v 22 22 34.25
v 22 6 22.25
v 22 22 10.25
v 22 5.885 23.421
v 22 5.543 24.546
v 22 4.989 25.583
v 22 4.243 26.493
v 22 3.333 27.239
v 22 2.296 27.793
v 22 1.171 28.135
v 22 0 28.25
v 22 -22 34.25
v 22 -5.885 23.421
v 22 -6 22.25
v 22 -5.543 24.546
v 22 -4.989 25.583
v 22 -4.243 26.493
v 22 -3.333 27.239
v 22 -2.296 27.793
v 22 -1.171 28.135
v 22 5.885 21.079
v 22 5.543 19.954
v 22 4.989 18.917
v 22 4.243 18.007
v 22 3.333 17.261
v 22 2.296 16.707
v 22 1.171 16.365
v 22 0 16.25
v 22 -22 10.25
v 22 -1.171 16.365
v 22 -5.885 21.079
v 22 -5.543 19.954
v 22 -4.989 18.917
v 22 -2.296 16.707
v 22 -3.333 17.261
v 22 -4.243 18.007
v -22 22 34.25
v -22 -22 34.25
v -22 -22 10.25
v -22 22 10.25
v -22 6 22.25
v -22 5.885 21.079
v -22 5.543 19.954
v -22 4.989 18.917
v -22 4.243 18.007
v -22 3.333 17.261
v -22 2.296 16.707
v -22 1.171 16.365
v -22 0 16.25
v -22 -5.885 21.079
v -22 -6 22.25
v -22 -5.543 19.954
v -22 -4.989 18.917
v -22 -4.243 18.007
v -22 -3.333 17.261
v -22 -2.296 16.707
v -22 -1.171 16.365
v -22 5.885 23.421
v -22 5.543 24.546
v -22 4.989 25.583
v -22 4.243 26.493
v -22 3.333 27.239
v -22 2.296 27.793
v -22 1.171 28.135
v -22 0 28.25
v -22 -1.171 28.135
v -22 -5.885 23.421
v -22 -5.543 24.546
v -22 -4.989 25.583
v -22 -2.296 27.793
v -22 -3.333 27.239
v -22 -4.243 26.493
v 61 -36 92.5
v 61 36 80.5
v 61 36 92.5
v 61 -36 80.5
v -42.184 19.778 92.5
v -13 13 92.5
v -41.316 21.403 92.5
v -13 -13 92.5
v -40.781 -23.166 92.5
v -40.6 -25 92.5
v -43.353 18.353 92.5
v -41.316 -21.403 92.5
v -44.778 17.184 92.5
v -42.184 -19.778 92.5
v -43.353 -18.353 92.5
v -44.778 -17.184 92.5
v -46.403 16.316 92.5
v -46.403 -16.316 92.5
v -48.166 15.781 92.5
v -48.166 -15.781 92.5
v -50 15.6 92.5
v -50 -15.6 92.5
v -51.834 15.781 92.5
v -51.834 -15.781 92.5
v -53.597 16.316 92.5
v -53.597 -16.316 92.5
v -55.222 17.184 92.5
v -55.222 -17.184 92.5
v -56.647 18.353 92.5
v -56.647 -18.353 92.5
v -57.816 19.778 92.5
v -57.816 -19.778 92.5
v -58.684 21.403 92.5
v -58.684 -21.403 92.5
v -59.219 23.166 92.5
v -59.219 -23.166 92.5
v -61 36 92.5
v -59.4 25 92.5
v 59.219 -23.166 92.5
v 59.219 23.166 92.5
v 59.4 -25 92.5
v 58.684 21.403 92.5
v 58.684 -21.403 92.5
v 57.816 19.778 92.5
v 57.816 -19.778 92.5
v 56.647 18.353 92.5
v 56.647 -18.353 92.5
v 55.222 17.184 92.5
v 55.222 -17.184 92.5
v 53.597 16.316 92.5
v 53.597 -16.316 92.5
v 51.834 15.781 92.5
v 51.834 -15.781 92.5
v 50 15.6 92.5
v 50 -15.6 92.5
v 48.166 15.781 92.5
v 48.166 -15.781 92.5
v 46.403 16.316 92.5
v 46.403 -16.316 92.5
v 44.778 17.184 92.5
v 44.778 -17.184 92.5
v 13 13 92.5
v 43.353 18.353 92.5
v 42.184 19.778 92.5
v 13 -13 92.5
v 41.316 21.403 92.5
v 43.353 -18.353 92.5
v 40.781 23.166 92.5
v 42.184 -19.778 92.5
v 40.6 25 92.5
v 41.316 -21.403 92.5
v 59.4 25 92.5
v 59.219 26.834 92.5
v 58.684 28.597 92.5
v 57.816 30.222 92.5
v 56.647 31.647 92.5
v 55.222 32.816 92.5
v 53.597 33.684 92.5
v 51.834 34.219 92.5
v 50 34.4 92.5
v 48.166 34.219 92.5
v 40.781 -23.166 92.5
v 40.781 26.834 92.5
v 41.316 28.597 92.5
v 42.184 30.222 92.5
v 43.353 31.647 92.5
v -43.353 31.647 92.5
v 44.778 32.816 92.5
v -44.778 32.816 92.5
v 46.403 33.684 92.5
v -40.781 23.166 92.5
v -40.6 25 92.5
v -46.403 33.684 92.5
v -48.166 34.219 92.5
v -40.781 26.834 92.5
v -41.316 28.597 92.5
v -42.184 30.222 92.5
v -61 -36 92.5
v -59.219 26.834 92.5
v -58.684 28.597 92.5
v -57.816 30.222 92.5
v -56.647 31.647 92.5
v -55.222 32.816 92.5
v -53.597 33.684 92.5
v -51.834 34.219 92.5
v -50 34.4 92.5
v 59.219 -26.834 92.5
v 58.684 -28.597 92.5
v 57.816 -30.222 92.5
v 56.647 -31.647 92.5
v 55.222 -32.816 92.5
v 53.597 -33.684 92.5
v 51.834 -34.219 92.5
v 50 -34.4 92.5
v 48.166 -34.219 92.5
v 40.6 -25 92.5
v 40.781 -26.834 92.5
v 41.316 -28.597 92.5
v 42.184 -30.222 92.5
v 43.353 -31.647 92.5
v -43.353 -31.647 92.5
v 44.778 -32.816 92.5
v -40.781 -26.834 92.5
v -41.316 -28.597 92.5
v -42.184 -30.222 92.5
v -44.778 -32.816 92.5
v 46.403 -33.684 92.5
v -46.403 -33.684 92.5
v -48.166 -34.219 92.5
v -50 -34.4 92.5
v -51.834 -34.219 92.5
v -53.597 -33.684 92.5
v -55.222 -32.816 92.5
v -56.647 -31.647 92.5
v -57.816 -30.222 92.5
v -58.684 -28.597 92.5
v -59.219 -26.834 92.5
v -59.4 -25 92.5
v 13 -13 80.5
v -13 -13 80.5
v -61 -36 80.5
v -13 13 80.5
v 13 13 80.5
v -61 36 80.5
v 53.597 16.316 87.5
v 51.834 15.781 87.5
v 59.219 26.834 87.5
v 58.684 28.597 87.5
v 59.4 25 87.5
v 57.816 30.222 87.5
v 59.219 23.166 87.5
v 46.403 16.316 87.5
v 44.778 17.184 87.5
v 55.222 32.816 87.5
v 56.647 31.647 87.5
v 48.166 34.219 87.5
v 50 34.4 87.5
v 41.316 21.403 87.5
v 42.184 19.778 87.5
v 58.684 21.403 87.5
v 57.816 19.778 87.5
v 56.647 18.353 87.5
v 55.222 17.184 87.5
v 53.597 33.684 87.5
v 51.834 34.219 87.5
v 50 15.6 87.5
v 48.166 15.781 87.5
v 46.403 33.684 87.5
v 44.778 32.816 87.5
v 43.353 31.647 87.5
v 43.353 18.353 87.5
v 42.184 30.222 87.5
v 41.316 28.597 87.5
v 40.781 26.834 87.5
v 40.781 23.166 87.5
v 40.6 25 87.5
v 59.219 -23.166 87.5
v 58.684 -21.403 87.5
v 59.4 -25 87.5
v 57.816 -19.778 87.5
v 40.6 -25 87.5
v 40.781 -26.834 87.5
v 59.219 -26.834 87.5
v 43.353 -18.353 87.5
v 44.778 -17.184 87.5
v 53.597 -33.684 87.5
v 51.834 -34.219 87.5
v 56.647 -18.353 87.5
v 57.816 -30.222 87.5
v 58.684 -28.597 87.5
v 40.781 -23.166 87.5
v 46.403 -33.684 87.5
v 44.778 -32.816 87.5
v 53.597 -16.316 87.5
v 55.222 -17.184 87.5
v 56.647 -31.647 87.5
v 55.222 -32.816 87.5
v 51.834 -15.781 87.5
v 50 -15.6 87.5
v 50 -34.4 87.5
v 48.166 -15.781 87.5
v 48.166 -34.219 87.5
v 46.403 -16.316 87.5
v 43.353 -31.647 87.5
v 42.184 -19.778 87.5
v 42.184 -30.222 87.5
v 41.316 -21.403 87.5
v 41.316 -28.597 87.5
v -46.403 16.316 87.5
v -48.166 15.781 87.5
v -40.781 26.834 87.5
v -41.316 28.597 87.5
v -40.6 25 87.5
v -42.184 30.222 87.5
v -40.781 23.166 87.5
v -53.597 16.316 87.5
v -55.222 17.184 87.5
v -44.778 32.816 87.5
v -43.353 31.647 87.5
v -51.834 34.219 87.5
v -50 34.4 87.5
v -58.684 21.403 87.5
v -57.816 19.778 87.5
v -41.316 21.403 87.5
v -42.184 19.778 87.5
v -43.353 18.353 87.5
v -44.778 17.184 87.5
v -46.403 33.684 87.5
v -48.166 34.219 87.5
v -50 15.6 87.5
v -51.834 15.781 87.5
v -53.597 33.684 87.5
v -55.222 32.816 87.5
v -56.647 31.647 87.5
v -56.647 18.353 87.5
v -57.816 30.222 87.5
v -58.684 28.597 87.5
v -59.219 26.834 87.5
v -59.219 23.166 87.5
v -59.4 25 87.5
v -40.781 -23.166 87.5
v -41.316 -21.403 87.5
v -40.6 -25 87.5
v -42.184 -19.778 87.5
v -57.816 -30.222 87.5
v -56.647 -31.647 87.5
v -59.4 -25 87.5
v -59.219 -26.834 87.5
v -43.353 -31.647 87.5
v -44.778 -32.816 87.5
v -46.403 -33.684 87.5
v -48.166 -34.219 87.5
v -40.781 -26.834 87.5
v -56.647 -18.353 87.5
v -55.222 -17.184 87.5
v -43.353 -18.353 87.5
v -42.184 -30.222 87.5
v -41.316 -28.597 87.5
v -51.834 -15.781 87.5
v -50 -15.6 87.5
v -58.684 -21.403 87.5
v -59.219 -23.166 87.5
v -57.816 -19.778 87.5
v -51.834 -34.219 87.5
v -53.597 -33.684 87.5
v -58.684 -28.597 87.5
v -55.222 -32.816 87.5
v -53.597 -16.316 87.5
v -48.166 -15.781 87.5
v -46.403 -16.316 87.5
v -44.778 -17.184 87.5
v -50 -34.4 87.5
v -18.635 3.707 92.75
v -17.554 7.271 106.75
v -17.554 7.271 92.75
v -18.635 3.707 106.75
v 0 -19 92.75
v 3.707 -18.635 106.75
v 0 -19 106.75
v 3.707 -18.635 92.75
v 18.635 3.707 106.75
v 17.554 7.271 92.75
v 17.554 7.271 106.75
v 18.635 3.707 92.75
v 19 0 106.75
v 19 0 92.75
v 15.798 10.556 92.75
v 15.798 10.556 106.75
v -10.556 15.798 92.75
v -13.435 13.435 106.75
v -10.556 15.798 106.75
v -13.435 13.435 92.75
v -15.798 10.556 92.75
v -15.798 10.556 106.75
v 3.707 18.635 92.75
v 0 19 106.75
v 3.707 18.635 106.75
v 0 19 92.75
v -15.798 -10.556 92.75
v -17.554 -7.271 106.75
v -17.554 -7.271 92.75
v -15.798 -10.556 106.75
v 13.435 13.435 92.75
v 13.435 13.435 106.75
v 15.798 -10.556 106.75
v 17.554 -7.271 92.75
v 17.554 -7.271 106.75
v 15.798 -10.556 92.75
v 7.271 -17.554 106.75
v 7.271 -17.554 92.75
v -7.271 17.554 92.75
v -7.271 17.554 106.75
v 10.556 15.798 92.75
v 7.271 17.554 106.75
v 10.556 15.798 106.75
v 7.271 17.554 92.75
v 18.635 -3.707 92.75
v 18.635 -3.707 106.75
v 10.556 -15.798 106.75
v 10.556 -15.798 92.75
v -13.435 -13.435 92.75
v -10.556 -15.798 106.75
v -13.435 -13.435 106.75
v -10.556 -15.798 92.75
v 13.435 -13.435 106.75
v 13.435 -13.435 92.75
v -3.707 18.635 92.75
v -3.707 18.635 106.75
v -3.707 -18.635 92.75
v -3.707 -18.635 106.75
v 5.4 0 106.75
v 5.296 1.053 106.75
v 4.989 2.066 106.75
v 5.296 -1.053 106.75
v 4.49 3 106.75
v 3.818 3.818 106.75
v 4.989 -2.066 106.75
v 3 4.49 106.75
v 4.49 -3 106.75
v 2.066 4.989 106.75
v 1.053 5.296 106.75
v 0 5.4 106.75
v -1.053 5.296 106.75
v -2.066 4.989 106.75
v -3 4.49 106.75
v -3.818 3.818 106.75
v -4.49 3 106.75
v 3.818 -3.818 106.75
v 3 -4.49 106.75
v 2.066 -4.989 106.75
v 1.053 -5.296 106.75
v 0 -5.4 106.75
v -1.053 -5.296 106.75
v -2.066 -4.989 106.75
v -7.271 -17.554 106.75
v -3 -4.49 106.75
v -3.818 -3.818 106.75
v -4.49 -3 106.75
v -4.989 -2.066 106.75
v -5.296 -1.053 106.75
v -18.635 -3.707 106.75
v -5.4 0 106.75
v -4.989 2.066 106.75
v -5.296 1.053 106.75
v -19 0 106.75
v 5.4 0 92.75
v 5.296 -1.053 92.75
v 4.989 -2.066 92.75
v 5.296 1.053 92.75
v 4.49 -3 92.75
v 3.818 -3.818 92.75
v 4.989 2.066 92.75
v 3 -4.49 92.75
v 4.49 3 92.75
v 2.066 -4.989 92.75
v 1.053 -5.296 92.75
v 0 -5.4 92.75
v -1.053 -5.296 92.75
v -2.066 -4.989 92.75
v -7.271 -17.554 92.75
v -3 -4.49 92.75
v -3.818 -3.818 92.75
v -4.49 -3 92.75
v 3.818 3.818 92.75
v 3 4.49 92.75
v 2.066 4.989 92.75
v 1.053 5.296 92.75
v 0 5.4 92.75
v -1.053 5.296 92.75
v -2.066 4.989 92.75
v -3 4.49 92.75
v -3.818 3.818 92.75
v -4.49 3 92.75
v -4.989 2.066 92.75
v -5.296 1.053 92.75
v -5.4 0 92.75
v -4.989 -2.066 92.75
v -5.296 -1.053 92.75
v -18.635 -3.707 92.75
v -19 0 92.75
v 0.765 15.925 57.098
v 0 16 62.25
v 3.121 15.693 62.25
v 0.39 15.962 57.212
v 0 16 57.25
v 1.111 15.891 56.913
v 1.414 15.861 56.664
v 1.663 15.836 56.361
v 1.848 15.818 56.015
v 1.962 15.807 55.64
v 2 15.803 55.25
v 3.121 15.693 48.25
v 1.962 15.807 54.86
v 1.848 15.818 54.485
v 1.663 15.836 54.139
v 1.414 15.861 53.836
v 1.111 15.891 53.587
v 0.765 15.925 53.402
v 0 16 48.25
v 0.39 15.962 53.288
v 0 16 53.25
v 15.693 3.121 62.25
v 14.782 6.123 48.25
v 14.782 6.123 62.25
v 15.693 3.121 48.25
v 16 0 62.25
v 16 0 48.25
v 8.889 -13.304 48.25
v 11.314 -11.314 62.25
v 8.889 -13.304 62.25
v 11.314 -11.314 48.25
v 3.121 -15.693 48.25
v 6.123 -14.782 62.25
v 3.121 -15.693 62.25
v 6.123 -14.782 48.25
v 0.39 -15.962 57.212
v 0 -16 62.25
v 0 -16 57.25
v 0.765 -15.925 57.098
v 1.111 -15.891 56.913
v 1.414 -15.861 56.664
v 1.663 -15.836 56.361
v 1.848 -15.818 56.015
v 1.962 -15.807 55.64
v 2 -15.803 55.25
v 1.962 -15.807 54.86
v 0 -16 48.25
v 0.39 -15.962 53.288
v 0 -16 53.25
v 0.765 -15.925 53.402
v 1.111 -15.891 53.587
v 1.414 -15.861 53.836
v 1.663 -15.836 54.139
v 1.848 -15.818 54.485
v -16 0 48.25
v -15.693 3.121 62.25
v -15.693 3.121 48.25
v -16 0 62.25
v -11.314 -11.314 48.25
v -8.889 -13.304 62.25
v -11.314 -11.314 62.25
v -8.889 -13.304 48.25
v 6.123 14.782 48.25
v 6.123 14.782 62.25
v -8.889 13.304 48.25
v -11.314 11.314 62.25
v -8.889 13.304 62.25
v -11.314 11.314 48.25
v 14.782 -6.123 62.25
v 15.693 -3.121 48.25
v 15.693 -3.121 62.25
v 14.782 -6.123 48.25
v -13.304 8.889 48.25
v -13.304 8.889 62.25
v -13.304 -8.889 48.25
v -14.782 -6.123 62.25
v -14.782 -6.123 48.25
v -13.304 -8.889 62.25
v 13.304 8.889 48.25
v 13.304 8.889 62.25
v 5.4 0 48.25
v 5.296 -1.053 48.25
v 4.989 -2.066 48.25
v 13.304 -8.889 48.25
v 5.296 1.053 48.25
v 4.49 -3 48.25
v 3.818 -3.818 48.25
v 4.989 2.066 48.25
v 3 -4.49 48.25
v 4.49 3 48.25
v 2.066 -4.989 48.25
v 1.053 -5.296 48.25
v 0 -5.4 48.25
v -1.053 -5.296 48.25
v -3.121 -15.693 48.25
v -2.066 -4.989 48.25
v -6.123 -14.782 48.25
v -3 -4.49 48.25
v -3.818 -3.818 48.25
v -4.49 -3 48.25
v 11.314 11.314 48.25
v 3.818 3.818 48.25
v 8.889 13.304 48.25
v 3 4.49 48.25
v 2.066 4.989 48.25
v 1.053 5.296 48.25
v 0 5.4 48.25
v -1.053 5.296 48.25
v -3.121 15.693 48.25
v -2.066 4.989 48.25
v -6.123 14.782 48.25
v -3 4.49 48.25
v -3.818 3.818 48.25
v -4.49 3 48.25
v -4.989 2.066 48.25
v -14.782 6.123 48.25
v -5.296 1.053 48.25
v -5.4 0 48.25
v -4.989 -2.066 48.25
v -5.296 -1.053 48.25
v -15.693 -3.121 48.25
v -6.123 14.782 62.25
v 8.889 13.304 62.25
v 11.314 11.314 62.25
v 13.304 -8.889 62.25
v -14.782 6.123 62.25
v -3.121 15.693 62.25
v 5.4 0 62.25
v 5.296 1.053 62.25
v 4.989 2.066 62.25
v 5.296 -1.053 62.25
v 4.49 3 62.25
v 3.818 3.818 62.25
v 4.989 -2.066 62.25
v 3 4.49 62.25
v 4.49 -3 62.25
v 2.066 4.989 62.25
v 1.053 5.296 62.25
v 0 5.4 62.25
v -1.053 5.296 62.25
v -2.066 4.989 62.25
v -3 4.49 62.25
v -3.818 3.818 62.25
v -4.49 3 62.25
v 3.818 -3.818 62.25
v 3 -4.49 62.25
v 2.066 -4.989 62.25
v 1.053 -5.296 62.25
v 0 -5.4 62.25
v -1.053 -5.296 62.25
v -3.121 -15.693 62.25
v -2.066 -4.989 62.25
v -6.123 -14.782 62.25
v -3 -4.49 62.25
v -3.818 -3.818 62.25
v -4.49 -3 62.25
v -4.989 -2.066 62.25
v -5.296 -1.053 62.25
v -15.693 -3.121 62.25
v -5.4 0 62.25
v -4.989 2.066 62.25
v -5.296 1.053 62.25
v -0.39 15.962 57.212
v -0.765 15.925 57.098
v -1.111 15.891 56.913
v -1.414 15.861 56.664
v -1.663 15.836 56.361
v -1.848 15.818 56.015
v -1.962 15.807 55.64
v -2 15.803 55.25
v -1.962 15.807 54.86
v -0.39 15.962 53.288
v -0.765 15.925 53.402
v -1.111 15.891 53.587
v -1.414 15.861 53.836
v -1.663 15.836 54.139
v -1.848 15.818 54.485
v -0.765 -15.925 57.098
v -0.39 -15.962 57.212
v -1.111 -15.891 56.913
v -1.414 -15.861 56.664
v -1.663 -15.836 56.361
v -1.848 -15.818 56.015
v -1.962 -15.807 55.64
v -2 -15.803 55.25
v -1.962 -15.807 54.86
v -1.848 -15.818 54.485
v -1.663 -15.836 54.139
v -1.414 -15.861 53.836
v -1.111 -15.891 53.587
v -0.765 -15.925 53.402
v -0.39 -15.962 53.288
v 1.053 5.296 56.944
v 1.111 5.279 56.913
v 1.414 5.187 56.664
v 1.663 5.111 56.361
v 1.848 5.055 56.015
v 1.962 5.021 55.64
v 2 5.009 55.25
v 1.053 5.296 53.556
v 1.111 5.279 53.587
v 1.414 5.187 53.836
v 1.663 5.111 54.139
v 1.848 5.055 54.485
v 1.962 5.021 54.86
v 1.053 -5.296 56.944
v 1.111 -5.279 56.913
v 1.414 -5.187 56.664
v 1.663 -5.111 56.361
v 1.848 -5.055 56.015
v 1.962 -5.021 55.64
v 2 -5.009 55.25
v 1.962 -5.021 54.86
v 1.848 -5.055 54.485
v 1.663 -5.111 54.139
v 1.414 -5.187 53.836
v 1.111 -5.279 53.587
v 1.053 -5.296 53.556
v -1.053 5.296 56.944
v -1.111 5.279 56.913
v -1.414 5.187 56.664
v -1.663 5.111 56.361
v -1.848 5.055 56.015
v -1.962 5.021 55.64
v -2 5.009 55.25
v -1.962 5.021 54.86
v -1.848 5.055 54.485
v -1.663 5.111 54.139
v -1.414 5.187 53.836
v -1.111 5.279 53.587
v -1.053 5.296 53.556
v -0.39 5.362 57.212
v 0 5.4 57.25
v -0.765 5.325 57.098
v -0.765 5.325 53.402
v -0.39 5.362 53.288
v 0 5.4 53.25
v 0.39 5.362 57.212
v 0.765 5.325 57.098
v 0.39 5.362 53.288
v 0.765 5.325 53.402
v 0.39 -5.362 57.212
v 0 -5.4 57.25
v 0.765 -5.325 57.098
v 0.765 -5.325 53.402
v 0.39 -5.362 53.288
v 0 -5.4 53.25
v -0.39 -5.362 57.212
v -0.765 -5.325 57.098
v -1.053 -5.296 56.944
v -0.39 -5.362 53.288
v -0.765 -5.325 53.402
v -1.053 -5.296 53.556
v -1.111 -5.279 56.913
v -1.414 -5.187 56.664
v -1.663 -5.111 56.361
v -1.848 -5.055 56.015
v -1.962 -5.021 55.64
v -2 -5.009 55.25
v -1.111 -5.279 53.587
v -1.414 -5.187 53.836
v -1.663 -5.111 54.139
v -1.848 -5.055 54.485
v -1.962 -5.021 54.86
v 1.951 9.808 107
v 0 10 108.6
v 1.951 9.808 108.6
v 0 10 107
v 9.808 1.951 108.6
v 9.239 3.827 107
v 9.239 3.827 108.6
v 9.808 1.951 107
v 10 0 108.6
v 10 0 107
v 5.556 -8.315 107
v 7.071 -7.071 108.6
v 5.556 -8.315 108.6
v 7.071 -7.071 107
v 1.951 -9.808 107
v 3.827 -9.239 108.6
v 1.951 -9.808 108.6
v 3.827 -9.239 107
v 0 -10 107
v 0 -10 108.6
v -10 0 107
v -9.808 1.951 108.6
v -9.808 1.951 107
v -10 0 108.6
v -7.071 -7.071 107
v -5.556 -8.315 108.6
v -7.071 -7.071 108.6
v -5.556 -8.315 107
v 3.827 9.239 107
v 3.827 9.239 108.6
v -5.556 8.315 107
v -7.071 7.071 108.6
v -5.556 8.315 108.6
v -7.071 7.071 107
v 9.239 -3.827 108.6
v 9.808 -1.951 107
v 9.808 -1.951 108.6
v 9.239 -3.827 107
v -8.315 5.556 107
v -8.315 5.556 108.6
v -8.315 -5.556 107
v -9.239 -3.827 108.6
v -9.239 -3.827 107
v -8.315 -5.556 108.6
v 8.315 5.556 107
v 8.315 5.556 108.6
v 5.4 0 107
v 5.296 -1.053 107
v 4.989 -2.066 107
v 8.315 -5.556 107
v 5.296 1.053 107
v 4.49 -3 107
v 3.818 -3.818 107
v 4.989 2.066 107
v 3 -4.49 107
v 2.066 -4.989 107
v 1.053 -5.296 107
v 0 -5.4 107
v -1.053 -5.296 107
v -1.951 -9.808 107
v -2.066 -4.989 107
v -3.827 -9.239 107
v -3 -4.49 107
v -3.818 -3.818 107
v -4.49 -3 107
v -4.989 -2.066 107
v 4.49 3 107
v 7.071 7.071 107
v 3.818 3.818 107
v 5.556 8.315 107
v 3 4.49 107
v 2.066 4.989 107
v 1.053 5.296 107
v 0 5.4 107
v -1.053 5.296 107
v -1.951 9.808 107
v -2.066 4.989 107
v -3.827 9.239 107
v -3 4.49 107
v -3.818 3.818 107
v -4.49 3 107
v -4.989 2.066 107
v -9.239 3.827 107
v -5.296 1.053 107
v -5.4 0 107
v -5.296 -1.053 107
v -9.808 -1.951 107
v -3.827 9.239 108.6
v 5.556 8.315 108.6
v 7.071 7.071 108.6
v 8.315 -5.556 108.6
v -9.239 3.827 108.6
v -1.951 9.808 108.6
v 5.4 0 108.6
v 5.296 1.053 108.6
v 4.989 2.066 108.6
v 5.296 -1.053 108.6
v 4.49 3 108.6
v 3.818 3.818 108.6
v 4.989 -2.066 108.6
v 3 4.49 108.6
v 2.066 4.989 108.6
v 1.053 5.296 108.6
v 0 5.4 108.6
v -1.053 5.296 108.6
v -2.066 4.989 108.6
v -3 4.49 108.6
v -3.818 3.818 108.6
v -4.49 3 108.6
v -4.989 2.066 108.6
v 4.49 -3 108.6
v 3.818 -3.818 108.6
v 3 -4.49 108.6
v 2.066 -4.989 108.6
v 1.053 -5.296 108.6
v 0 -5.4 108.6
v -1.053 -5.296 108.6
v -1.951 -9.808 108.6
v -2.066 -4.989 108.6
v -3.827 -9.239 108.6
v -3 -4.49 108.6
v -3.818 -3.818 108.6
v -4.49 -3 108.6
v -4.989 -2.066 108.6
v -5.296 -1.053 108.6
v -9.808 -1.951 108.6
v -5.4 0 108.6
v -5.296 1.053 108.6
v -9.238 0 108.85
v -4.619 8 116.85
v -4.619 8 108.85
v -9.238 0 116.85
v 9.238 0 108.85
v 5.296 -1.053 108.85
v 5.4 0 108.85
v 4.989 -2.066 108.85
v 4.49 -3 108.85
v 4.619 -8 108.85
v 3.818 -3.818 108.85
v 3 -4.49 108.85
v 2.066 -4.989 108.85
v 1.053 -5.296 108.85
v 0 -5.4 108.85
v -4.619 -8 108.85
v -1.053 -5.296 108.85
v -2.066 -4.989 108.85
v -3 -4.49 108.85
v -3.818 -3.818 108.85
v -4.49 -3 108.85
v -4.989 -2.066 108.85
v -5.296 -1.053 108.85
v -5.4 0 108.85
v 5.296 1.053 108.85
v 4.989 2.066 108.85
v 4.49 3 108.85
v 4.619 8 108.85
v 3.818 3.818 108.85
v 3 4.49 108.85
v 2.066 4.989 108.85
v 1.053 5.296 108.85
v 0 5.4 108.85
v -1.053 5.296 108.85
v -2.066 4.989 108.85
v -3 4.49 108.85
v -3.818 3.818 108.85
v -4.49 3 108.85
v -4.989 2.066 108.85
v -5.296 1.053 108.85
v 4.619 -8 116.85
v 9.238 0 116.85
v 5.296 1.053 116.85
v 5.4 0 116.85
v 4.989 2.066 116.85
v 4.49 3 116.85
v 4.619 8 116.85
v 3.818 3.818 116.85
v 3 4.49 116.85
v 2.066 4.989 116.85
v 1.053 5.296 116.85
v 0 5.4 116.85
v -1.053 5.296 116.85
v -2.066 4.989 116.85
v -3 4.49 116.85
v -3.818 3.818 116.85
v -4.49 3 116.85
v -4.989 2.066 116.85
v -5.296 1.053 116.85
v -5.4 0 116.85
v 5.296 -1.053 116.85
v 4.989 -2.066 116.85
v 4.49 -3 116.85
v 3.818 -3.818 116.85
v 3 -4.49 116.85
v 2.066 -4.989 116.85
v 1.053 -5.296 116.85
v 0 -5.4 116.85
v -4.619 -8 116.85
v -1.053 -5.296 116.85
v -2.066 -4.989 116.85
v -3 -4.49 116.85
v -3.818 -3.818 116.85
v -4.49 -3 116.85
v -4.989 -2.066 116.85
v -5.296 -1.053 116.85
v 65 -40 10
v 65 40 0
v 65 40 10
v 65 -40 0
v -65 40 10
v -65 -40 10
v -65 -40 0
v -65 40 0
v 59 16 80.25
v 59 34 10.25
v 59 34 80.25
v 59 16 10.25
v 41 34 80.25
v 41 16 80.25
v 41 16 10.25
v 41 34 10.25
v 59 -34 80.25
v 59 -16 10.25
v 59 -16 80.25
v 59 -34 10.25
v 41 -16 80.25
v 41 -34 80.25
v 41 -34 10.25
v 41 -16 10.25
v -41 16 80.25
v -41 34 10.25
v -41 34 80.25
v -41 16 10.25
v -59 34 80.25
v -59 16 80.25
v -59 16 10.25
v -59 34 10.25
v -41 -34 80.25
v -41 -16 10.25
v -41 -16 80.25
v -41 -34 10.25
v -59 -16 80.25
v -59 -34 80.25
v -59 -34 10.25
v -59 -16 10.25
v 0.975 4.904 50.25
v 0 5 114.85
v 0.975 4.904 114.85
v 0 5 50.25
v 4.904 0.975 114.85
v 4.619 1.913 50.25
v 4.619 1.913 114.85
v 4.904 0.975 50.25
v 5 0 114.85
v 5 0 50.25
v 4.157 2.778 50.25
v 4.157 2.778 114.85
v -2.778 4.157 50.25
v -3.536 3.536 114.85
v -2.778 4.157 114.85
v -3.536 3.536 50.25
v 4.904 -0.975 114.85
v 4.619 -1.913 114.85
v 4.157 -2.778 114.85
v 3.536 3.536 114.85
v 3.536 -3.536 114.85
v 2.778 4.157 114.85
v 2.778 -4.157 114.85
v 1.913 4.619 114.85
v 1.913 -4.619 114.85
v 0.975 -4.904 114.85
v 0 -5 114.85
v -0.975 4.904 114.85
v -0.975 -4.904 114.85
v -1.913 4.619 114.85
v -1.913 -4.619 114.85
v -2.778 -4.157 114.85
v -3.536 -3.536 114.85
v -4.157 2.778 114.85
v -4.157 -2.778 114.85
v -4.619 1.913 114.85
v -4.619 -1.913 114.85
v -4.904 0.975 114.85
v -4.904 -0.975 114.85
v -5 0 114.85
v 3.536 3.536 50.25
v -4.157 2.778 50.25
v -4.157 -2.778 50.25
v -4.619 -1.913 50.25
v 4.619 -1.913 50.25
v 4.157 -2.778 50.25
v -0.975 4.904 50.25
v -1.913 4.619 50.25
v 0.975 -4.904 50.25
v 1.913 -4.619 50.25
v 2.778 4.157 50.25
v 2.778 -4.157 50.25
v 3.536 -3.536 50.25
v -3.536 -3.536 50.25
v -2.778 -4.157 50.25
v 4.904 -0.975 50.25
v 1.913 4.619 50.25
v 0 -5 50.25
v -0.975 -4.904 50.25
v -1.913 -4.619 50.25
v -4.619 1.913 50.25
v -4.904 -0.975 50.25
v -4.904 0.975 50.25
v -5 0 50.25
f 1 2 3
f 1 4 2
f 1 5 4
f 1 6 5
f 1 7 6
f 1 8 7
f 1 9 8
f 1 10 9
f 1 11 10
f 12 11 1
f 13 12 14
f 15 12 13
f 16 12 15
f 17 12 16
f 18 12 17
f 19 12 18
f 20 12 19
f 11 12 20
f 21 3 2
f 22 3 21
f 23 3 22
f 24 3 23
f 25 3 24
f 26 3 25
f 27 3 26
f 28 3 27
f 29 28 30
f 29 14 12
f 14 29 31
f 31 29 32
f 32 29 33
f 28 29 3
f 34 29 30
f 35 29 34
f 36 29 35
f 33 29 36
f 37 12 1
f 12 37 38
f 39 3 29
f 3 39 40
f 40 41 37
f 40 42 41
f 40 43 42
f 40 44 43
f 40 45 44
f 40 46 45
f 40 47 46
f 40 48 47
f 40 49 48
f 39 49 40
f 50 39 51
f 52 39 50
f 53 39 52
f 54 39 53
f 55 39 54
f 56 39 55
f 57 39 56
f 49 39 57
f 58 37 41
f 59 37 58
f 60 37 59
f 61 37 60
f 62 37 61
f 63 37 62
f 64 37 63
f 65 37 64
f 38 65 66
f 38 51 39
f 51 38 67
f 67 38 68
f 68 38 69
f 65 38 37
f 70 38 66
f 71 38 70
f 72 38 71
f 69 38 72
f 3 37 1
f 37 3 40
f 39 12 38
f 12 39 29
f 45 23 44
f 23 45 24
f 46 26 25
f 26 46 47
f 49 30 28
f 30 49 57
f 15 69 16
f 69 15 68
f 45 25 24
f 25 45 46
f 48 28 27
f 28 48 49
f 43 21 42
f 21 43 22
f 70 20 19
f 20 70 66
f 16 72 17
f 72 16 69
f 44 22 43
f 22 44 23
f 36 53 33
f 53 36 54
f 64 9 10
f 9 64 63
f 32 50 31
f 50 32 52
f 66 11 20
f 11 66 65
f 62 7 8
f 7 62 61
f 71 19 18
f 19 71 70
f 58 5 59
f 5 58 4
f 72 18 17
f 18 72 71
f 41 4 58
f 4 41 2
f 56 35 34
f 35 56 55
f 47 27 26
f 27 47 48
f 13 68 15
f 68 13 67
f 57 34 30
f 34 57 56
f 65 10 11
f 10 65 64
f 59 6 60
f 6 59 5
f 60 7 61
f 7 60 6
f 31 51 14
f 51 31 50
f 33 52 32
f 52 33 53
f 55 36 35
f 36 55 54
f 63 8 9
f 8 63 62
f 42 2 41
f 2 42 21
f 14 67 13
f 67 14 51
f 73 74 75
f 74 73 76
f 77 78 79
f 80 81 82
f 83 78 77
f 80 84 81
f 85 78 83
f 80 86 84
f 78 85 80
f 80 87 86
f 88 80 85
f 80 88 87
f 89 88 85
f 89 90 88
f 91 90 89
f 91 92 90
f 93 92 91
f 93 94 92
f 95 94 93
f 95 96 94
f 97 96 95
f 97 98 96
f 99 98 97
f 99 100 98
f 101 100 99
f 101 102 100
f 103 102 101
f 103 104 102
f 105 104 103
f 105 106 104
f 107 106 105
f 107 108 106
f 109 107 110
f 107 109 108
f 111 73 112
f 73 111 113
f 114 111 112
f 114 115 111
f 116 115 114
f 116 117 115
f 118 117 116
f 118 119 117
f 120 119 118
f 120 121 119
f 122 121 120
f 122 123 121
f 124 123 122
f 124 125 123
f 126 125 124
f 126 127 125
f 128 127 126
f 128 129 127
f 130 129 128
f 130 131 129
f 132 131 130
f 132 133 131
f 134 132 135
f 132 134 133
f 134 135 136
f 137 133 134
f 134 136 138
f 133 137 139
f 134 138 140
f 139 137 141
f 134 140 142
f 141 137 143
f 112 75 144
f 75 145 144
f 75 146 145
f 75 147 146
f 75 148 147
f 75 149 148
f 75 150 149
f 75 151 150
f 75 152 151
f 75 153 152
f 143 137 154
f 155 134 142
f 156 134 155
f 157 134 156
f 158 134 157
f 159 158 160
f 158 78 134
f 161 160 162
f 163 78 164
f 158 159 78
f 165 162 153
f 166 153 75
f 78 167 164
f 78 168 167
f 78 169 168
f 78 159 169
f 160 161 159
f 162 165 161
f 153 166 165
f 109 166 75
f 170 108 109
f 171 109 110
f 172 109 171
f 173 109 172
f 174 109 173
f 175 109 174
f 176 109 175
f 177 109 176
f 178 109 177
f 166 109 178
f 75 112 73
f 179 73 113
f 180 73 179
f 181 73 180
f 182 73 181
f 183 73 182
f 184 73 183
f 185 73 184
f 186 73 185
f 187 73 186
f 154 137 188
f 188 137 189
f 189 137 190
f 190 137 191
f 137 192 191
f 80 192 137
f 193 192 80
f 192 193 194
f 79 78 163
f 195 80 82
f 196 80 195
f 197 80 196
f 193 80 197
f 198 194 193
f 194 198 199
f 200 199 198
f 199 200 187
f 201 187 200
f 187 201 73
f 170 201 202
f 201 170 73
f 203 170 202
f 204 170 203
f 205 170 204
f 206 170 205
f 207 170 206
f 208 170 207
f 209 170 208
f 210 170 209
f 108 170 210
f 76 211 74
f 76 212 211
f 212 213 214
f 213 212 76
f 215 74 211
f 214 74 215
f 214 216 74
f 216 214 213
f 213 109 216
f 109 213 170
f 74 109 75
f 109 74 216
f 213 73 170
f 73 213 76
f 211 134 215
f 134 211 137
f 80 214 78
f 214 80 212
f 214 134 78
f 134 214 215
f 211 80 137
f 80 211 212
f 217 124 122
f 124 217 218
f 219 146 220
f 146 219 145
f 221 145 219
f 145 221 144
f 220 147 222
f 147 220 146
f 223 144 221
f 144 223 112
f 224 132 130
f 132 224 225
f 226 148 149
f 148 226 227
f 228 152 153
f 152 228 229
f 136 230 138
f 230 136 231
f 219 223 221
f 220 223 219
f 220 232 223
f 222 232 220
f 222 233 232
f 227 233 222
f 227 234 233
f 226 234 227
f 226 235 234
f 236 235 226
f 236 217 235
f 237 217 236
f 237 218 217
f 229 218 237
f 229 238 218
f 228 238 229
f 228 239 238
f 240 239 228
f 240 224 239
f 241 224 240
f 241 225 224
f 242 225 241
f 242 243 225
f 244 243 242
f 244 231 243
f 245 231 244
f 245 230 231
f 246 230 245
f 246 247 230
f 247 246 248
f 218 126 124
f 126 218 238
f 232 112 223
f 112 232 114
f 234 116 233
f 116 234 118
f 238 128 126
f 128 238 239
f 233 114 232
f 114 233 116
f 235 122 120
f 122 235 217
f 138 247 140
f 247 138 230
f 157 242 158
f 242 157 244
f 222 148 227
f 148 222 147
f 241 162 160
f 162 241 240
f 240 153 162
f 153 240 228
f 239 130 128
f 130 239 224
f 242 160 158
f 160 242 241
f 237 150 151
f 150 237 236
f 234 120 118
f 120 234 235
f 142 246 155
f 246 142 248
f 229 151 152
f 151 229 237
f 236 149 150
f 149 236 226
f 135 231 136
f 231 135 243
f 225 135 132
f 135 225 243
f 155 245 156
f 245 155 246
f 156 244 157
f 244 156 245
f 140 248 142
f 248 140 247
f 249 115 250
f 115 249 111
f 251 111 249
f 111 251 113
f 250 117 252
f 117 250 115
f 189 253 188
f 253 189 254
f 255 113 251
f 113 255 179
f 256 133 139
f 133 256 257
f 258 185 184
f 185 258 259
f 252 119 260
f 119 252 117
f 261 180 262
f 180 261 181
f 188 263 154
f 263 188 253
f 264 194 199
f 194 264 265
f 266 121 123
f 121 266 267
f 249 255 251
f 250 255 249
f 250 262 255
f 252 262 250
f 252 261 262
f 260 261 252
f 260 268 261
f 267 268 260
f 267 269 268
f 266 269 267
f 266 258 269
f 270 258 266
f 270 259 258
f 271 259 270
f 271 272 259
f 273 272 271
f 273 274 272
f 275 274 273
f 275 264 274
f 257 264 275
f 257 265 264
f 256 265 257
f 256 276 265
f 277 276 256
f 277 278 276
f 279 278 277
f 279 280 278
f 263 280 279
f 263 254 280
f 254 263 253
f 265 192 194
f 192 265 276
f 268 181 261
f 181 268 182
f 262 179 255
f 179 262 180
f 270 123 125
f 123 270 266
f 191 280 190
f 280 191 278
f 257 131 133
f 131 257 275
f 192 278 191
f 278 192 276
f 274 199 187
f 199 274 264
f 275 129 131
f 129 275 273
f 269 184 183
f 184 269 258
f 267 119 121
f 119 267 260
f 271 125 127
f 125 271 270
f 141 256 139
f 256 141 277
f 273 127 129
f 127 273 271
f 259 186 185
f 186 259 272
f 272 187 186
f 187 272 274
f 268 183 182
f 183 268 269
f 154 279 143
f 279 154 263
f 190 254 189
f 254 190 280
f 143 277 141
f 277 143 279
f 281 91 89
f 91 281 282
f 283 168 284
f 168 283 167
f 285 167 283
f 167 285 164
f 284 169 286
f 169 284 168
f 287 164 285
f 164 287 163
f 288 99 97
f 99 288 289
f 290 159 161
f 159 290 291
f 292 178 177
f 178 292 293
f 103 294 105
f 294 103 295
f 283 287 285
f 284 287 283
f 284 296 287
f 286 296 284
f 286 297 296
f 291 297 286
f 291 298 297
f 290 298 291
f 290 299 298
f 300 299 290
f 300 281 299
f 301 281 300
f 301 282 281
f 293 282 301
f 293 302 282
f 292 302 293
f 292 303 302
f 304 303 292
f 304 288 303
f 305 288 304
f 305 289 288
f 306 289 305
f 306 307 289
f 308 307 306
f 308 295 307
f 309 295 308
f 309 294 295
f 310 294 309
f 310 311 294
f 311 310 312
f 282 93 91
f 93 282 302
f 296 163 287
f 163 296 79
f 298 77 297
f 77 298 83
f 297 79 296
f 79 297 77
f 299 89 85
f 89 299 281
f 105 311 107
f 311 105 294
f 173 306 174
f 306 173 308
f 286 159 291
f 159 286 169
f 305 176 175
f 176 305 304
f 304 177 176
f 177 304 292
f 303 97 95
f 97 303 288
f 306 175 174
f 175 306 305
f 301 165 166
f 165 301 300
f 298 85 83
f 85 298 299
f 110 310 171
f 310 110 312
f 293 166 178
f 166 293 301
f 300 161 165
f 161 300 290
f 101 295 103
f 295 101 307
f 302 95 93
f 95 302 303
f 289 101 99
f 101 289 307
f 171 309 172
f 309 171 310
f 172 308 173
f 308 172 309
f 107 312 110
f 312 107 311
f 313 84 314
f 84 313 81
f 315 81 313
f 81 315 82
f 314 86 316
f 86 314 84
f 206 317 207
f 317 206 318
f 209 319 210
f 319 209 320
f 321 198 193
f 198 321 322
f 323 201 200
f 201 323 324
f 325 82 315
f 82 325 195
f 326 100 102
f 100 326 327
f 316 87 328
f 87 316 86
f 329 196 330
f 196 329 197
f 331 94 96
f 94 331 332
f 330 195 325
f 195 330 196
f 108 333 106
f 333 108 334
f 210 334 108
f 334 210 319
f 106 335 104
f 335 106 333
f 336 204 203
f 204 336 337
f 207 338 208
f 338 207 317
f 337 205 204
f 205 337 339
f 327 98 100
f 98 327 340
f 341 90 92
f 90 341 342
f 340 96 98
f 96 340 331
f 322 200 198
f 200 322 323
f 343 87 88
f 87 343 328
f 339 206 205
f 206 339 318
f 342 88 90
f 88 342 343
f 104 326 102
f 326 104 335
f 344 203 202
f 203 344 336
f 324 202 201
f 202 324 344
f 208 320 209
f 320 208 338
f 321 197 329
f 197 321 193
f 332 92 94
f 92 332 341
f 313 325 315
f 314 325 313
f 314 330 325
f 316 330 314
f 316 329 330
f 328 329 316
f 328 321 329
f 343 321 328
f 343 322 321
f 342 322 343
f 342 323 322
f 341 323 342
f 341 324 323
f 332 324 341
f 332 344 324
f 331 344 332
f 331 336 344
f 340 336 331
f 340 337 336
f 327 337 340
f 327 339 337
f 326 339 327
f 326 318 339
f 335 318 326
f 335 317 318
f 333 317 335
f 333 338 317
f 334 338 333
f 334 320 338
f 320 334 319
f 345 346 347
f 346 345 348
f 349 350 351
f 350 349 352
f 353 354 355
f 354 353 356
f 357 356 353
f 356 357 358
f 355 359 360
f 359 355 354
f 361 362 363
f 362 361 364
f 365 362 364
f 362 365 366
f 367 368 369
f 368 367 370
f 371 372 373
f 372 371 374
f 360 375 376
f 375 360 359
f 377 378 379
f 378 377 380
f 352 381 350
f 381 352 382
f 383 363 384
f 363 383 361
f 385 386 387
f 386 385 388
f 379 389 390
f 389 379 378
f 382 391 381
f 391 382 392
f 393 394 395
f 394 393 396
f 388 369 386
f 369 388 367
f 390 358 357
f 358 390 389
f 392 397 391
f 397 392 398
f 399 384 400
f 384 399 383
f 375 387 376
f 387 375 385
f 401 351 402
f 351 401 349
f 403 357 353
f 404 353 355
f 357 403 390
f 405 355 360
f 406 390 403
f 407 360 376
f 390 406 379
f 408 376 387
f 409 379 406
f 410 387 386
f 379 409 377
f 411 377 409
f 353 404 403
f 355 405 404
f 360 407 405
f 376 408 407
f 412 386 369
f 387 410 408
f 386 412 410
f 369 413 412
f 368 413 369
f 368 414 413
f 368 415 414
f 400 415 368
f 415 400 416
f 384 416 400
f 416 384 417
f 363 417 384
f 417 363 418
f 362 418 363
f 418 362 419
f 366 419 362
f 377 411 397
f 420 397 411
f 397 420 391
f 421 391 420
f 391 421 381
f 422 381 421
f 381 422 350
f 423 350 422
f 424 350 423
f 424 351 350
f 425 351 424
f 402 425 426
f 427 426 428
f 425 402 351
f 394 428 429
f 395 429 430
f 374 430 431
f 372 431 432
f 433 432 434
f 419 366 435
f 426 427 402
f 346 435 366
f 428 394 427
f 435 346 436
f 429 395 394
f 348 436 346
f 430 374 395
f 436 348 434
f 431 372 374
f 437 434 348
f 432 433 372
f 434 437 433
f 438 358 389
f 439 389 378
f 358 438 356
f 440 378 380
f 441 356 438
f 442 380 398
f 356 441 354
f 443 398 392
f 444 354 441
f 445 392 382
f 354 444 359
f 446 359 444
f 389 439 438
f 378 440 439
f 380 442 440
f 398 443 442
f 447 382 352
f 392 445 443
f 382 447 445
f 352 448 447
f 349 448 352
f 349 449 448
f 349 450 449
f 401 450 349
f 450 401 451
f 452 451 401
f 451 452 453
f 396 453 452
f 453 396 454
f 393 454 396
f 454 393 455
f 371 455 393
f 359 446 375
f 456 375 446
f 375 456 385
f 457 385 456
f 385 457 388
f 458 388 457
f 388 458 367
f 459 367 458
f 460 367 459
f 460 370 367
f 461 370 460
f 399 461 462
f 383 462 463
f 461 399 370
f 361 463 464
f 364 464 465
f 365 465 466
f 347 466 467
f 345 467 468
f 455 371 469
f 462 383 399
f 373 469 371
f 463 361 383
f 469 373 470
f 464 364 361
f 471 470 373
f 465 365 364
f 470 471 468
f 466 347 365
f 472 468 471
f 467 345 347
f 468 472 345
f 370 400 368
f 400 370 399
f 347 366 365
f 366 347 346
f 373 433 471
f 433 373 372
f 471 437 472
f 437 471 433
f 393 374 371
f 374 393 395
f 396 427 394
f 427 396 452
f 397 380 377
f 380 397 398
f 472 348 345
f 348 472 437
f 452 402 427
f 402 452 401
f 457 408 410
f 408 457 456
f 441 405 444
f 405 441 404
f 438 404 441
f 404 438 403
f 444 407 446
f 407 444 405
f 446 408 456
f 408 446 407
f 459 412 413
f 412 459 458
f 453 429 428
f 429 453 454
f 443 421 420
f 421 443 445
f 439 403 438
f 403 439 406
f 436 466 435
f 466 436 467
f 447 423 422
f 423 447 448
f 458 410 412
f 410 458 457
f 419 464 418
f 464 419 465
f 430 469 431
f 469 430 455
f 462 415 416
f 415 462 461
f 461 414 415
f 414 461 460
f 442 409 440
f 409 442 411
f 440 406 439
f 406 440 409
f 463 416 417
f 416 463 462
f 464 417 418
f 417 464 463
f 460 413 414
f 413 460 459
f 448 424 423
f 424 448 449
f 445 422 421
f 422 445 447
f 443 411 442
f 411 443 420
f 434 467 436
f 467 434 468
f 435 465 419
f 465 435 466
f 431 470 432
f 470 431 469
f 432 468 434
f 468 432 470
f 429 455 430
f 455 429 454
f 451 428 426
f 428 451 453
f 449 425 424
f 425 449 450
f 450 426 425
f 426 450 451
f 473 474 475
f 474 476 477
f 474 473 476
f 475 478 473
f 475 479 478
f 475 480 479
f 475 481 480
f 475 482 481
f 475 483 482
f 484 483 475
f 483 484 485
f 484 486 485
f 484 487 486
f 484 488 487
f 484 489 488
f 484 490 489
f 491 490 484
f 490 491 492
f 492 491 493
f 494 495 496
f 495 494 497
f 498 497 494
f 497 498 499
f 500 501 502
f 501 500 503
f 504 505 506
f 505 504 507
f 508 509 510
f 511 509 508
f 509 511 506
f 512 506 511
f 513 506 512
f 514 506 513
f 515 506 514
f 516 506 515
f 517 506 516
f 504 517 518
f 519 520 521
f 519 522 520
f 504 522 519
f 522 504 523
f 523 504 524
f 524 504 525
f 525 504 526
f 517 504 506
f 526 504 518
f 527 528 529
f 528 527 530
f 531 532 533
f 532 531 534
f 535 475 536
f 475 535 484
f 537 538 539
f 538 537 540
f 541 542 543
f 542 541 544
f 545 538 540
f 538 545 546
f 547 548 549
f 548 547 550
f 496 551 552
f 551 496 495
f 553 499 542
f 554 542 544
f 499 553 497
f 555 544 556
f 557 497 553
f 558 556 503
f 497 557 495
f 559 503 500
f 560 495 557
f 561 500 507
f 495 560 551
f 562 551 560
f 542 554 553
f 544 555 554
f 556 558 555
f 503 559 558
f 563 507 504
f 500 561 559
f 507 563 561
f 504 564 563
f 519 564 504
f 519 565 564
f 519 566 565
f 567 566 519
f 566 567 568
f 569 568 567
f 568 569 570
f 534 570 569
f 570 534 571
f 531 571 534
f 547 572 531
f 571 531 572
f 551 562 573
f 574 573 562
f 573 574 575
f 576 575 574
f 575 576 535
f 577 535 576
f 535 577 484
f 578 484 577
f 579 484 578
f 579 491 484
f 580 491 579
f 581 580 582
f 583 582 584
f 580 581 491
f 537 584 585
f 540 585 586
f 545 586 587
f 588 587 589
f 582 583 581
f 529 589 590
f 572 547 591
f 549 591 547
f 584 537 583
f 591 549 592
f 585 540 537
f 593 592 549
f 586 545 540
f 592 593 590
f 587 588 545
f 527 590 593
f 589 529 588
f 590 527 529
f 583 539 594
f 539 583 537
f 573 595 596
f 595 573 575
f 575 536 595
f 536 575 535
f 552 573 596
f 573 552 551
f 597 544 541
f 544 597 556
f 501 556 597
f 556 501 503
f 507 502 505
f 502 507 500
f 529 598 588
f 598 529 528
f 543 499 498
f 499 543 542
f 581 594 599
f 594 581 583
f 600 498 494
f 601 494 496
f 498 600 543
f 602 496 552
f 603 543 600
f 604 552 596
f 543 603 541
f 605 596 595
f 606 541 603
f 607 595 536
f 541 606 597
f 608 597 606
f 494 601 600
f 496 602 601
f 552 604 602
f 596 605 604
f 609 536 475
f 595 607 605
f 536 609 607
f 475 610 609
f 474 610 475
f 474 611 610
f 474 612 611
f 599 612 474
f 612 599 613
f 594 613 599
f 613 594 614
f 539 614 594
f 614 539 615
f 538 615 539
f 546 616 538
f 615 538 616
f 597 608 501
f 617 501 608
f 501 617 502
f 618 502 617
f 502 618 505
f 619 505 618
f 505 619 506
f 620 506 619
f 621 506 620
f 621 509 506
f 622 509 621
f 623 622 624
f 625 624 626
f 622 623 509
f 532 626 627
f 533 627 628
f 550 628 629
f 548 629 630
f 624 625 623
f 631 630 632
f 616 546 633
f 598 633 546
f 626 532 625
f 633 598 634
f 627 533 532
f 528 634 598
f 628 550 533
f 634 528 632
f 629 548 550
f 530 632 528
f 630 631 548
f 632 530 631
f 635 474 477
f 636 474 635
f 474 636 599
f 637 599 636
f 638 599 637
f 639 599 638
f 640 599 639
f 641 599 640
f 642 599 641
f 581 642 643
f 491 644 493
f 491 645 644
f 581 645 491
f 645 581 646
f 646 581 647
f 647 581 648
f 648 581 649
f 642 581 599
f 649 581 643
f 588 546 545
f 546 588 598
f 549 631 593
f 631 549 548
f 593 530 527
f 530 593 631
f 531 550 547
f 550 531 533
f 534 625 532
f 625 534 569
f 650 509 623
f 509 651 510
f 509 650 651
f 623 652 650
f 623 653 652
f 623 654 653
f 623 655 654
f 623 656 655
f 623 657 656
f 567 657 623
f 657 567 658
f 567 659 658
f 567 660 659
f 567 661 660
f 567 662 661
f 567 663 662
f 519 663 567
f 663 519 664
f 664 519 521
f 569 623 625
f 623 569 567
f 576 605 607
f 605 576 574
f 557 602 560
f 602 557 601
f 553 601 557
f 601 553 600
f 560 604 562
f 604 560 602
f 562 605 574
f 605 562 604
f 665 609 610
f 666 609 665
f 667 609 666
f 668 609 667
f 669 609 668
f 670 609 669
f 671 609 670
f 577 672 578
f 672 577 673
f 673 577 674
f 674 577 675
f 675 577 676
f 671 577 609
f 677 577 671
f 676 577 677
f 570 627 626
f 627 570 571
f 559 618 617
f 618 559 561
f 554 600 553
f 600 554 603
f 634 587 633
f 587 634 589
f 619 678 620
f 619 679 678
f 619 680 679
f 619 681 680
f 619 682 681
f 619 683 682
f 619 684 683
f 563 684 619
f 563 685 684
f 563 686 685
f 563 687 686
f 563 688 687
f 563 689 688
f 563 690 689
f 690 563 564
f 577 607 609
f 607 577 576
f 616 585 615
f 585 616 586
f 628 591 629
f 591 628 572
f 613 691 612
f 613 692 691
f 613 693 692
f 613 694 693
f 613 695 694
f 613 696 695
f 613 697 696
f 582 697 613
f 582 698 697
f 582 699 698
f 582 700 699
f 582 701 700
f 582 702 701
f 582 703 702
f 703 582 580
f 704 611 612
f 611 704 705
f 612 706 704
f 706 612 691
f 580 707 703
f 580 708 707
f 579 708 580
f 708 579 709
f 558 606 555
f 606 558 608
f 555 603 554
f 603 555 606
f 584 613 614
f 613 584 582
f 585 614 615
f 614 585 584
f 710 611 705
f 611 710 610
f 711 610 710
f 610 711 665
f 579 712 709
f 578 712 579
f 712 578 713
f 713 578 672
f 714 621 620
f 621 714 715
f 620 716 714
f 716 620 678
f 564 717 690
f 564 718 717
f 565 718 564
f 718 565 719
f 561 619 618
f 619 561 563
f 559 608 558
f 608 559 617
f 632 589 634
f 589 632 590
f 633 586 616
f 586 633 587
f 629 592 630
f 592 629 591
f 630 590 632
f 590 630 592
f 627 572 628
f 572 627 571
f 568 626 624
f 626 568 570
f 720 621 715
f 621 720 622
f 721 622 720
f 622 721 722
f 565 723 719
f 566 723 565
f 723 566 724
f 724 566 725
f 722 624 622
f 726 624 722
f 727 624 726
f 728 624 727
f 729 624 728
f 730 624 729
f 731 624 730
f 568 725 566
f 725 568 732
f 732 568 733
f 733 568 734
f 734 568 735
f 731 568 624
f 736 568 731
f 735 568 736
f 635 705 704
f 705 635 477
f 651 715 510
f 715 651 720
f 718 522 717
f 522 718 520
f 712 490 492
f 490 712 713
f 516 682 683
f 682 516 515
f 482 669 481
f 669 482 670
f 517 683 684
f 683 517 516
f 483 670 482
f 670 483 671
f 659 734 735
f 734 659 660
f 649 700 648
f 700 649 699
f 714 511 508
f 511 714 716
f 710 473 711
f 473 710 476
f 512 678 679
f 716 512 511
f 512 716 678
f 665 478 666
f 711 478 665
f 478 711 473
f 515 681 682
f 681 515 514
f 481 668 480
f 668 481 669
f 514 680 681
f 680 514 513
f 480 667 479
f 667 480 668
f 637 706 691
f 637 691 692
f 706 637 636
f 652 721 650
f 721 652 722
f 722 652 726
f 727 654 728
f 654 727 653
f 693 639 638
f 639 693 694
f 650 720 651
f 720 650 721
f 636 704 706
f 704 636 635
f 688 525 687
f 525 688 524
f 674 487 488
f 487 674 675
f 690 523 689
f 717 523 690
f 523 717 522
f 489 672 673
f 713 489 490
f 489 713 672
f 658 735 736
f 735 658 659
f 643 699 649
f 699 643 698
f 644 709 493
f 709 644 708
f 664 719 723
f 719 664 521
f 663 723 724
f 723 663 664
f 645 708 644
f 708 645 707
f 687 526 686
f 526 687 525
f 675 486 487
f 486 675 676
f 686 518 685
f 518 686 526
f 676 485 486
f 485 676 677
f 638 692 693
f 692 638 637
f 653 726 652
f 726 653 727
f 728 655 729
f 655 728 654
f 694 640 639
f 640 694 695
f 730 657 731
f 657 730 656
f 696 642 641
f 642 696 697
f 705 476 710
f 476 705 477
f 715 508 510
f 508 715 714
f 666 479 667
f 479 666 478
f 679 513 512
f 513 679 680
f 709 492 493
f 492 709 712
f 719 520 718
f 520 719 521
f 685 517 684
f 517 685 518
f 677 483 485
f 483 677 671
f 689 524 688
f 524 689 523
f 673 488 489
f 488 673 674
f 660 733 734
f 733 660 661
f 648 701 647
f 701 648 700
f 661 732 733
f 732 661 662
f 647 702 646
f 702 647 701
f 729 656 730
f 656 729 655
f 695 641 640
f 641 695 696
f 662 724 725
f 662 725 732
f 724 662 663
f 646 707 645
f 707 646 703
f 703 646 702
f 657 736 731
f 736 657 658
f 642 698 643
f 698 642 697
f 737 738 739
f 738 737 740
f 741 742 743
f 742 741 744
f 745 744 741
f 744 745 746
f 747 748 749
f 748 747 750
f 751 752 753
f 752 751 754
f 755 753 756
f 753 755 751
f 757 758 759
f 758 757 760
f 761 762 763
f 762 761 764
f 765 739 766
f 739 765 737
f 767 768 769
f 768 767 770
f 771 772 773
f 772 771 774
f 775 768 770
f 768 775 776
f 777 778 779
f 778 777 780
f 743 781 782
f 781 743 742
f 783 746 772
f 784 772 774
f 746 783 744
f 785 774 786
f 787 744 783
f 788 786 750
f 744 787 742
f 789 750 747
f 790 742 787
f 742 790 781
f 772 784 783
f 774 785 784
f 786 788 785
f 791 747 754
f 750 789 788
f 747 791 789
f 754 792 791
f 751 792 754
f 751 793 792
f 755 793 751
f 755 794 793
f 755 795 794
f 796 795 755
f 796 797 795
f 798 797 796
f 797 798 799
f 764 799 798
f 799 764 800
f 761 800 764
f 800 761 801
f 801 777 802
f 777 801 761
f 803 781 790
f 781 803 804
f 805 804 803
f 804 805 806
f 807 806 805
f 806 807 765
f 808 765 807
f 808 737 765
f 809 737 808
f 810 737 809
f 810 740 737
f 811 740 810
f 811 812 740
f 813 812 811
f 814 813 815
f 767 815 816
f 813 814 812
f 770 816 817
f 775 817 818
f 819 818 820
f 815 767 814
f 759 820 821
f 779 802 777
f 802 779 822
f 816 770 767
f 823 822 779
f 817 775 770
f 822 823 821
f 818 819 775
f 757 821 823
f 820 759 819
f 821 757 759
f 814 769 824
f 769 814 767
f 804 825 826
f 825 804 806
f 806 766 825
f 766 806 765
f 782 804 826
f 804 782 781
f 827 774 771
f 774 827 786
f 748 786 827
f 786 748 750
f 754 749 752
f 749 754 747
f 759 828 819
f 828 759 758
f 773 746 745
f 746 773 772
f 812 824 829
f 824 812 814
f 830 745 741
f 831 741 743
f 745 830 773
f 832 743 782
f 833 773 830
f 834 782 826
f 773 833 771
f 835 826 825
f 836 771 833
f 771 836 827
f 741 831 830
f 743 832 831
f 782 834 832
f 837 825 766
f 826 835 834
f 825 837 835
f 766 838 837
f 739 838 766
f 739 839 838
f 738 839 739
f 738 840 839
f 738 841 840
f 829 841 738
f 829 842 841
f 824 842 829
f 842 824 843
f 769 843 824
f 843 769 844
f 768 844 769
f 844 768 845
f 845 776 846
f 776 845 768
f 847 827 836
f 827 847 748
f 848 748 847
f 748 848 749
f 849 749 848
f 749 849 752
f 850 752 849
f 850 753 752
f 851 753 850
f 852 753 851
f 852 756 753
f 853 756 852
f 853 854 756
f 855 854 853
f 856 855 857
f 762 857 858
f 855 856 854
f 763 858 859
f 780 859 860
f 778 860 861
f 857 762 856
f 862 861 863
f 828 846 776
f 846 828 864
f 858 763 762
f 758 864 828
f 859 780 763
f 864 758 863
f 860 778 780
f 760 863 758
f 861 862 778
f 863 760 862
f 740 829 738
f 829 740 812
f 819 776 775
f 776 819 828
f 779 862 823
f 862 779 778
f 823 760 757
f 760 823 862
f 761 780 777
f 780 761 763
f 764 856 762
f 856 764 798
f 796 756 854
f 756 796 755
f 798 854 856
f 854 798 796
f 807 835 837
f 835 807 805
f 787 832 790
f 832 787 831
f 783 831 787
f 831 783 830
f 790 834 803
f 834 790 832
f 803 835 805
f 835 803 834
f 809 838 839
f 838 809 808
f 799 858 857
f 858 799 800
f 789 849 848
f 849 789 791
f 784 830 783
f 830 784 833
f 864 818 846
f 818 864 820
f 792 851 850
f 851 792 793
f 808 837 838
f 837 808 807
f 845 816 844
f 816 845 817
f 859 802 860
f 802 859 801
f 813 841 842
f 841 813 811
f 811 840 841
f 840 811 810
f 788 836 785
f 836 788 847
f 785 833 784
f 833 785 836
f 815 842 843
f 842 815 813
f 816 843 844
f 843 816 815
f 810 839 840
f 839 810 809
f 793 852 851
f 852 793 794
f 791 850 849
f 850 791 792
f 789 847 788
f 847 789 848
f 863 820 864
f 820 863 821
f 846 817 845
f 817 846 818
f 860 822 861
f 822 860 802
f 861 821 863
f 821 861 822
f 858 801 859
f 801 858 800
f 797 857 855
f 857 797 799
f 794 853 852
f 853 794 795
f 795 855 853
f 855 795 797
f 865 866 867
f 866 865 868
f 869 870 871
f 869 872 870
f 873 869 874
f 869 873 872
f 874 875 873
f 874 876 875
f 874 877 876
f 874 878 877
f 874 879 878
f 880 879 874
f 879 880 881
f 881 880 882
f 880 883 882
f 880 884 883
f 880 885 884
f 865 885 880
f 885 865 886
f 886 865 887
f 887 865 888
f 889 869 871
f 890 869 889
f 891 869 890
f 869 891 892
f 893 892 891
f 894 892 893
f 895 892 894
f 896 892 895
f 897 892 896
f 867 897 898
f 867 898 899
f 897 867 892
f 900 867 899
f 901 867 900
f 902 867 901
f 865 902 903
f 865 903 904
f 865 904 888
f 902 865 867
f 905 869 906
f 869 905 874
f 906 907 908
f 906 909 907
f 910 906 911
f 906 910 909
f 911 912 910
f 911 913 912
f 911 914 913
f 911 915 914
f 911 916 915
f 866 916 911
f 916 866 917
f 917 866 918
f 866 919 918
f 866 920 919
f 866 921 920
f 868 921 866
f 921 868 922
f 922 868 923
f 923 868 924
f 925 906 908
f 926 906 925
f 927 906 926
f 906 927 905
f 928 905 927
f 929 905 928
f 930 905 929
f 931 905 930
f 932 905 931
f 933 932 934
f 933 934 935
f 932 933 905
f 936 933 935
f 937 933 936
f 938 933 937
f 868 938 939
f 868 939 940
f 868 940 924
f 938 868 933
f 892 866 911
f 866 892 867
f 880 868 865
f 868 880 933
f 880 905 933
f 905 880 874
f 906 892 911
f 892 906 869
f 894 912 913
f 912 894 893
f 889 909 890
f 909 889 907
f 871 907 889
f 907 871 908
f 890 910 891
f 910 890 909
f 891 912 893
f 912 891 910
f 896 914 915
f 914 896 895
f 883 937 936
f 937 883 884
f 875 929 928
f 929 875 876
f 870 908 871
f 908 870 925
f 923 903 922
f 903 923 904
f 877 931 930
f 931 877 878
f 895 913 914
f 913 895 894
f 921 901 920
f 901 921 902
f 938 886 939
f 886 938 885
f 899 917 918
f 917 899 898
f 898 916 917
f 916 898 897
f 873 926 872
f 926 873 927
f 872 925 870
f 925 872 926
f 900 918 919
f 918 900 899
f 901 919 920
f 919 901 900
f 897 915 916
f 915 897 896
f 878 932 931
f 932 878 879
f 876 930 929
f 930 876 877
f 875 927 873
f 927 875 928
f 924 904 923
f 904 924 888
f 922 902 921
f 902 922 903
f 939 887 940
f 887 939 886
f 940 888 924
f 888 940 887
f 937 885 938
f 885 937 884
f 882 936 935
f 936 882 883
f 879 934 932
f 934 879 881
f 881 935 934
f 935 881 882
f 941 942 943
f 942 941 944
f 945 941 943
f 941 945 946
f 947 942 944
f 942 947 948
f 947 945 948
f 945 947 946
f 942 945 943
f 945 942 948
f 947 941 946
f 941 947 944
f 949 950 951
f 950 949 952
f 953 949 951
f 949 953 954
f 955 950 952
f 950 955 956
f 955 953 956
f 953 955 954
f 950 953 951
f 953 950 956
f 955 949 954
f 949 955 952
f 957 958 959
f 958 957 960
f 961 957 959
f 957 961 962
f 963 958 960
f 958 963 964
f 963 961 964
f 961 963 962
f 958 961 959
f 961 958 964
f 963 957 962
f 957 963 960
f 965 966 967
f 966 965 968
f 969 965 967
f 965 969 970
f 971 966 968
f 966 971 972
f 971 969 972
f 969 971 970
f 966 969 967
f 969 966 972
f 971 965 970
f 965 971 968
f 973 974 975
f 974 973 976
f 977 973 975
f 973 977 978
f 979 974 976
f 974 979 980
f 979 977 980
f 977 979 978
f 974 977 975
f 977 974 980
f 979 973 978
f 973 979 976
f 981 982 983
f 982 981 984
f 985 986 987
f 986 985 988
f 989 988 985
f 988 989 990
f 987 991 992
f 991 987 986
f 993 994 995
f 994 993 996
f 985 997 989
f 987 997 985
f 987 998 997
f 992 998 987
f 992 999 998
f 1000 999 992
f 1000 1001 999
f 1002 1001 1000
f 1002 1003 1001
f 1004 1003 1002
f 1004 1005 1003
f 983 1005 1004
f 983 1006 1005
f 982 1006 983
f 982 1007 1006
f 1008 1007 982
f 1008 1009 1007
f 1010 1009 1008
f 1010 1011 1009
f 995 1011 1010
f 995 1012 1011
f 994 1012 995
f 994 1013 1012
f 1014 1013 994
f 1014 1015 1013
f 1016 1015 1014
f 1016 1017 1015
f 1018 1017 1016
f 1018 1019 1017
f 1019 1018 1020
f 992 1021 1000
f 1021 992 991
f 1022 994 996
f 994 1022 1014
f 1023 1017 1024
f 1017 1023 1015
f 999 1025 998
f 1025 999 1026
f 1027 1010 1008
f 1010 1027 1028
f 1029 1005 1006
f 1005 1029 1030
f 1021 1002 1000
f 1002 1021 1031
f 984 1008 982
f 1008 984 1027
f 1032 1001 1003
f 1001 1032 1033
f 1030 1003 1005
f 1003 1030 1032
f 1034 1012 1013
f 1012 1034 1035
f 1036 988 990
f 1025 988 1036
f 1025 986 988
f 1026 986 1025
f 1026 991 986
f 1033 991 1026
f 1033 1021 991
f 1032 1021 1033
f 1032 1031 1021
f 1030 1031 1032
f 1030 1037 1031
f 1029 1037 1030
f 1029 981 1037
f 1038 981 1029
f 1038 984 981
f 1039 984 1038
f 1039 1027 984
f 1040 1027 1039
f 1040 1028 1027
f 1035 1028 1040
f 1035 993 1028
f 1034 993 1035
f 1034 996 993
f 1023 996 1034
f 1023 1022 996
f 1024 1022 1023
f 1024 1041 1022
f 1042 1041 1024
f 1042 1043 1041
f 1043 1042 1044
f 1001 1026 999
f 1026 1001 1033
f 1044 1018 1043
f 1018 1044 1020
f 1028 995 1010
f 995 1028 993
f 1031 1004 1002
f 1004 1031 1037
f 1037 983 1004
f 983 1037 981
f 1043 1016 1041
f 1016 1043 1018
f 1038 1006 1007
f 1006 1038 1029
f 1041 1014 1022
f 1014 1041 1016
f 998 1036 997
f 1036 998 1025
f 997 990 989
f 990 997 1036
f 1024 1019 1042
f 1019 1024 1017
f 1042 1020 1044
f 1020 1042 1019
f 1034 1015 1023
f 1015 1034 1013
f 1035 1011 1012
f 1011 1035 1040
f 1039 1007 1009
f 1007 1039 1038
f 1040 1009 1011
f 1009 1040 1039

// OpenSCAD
$fn = 32;

// ------------------------------------------------------------------------
// Arbor press fixture: screw d10, posts 70 mm, gap 14 mm
// Every part is its own module, assembly() places every instance.
// ------------------------------------------------------------------------

// --- part 1 ---
module press_bed() {
  difference() {
    translate([-65, -40, 0]) cube([130, 80, 10]);
  }
}

// --- part 2 ---
module anvil_block() {
  difference() {
    translate([-22, -22, 0]) cube([44, 44, 24]);
    translate([0, 0, 12]) rotate([0, 90, 0]) cylinder(h = 46, d = 12, center = true);
  }
}

// --- part 3 ---
module press_post_a() {
  translate([-9, -9, 0]) cube([18, 18, 70]);
}

// --- part 4 ---
module press_post_b() {
  translate([-9, -9, 0]) cube([18, 18, 70]);
}

// --- part 5 ---
module press_post_c() {
  translate([-9, -9, 0]) cube([18, 18, 70]);
}

// --- part 6 ---
module press_post_d() {
  translate([-9, -9, 0]) cube([18, 18, 70]);
}

// --- part 7 ---
module press_frame() {
  difference() {
    translate([-61, -36, 0]) cube([122, 72, 12]);
    translate([-13, -13, -1]) cube([26, 26, 14]);
    translate([50, 25, 7]) cylinder(h = 6, d = 18.8);
    translate([50, -25, 7]) cylinder(h = 6, d = 18.8);
    translate([-50, 25, 7]) cylinder(h = 6, d = 18.8);
    translate([-50, -25, 7]) cylinder(h = 6, d = 18.8);
  }
}

// --- part 8 ---
module guide_ring() {
  difference() {
      translate([0, 0, 0]) cylinder(h = 14, d = 38);
      translate([0, 0, -1]) cylinder(h = 16, d = 10.8);
    }
}

// --- part 9 ---
module press_screw() {
  translate([0, 0, -32.3]) cylinder(h = 64.6, d = 10);
}

// --- part 10 ---
module press_head() {
  difference() {
    cylinder(h = 14, d = 32);
    translate([0, 0, -1]) cylinder(h = 16, d = 10.8);
    translate([0, 0, 7]) rotate([90, 0, 0]) cylinder(h = 34, d = 4, center = true);
  }
}

// --- part 11 ---
module nut_washer() {
  difference() {
      translate([0, 0, 0]) cylinder(h = 1.6, d = 20);
      translate([0, 0, -1]) cylinder(h = 3.6, d = 10.8);
    }
}

// --- part 12 ---
module press_nut() {
  difference() {
    linear_extrude(height = 8) polygon(points = [[9.238, 0], [4.619, 8], [-4.619, 8], [-9.238, 0], [-4.619, -8], [4.619, -8]]);
    translate([0, 0, -1]) cylinder(h = 10, d = 10.8);
  }
}

// --- assembly ---
module assembly() {
  color([0.80, 0.24, 0.20]) translate([0, 0, 0]) rotate([0, 0, 0]) press_bed();
  color([0.20, 0.45, 0.75]) translate([0, 0, 10.25]) rotate([0, 0, 0]) anvil_block();
  color([0.25, 0.62, 0.32]) translate([50, 25, 10.25]) rotate([0, 0, 0]) press_post_a();
  color([0.92, 0.70, 0.18]) translate([50, -25, 10.25]) rotate([0, 0, 0]) press_post_b();
  color([0.58, 0.35, 0.70]) translate([-50, 25, 10.25]) rotate([0, 0, 0]) press_post_c();
  color([0.16, 0.66, 0.66]) translate([-50, -25, 10.25]) rotate([0, 0, 0]) press_post_d();
  color([0.85, 0.48, 0.18]) translate([0, 0, 80.5]) rotate([0, 0, 0]) press_frame();
  color([0.55, 0.60, 0.65]) translate([0, 0, 92.75]) rotate([0, 0, 0]) guide_ring();
  color([0.75, 0.30, 0.55]) translate([0, 0, 82.55]) rotate([0, 0, 0]) press_screw();
  color([0.42, 0.52, 0.28]) translate([0, 0, 48.25]) rotate([0, 0, 0]) press_head();
  color([0.80, 0.24, 0.20]) translate([0, 0, 107]) rotate([0, 0, 0]) nut_washer();
  color([0.20, 0.45, 0.75]) translate([0, 0, 108.85]) rotate([0, 0, 0]) press_nut();
}

assembly();
